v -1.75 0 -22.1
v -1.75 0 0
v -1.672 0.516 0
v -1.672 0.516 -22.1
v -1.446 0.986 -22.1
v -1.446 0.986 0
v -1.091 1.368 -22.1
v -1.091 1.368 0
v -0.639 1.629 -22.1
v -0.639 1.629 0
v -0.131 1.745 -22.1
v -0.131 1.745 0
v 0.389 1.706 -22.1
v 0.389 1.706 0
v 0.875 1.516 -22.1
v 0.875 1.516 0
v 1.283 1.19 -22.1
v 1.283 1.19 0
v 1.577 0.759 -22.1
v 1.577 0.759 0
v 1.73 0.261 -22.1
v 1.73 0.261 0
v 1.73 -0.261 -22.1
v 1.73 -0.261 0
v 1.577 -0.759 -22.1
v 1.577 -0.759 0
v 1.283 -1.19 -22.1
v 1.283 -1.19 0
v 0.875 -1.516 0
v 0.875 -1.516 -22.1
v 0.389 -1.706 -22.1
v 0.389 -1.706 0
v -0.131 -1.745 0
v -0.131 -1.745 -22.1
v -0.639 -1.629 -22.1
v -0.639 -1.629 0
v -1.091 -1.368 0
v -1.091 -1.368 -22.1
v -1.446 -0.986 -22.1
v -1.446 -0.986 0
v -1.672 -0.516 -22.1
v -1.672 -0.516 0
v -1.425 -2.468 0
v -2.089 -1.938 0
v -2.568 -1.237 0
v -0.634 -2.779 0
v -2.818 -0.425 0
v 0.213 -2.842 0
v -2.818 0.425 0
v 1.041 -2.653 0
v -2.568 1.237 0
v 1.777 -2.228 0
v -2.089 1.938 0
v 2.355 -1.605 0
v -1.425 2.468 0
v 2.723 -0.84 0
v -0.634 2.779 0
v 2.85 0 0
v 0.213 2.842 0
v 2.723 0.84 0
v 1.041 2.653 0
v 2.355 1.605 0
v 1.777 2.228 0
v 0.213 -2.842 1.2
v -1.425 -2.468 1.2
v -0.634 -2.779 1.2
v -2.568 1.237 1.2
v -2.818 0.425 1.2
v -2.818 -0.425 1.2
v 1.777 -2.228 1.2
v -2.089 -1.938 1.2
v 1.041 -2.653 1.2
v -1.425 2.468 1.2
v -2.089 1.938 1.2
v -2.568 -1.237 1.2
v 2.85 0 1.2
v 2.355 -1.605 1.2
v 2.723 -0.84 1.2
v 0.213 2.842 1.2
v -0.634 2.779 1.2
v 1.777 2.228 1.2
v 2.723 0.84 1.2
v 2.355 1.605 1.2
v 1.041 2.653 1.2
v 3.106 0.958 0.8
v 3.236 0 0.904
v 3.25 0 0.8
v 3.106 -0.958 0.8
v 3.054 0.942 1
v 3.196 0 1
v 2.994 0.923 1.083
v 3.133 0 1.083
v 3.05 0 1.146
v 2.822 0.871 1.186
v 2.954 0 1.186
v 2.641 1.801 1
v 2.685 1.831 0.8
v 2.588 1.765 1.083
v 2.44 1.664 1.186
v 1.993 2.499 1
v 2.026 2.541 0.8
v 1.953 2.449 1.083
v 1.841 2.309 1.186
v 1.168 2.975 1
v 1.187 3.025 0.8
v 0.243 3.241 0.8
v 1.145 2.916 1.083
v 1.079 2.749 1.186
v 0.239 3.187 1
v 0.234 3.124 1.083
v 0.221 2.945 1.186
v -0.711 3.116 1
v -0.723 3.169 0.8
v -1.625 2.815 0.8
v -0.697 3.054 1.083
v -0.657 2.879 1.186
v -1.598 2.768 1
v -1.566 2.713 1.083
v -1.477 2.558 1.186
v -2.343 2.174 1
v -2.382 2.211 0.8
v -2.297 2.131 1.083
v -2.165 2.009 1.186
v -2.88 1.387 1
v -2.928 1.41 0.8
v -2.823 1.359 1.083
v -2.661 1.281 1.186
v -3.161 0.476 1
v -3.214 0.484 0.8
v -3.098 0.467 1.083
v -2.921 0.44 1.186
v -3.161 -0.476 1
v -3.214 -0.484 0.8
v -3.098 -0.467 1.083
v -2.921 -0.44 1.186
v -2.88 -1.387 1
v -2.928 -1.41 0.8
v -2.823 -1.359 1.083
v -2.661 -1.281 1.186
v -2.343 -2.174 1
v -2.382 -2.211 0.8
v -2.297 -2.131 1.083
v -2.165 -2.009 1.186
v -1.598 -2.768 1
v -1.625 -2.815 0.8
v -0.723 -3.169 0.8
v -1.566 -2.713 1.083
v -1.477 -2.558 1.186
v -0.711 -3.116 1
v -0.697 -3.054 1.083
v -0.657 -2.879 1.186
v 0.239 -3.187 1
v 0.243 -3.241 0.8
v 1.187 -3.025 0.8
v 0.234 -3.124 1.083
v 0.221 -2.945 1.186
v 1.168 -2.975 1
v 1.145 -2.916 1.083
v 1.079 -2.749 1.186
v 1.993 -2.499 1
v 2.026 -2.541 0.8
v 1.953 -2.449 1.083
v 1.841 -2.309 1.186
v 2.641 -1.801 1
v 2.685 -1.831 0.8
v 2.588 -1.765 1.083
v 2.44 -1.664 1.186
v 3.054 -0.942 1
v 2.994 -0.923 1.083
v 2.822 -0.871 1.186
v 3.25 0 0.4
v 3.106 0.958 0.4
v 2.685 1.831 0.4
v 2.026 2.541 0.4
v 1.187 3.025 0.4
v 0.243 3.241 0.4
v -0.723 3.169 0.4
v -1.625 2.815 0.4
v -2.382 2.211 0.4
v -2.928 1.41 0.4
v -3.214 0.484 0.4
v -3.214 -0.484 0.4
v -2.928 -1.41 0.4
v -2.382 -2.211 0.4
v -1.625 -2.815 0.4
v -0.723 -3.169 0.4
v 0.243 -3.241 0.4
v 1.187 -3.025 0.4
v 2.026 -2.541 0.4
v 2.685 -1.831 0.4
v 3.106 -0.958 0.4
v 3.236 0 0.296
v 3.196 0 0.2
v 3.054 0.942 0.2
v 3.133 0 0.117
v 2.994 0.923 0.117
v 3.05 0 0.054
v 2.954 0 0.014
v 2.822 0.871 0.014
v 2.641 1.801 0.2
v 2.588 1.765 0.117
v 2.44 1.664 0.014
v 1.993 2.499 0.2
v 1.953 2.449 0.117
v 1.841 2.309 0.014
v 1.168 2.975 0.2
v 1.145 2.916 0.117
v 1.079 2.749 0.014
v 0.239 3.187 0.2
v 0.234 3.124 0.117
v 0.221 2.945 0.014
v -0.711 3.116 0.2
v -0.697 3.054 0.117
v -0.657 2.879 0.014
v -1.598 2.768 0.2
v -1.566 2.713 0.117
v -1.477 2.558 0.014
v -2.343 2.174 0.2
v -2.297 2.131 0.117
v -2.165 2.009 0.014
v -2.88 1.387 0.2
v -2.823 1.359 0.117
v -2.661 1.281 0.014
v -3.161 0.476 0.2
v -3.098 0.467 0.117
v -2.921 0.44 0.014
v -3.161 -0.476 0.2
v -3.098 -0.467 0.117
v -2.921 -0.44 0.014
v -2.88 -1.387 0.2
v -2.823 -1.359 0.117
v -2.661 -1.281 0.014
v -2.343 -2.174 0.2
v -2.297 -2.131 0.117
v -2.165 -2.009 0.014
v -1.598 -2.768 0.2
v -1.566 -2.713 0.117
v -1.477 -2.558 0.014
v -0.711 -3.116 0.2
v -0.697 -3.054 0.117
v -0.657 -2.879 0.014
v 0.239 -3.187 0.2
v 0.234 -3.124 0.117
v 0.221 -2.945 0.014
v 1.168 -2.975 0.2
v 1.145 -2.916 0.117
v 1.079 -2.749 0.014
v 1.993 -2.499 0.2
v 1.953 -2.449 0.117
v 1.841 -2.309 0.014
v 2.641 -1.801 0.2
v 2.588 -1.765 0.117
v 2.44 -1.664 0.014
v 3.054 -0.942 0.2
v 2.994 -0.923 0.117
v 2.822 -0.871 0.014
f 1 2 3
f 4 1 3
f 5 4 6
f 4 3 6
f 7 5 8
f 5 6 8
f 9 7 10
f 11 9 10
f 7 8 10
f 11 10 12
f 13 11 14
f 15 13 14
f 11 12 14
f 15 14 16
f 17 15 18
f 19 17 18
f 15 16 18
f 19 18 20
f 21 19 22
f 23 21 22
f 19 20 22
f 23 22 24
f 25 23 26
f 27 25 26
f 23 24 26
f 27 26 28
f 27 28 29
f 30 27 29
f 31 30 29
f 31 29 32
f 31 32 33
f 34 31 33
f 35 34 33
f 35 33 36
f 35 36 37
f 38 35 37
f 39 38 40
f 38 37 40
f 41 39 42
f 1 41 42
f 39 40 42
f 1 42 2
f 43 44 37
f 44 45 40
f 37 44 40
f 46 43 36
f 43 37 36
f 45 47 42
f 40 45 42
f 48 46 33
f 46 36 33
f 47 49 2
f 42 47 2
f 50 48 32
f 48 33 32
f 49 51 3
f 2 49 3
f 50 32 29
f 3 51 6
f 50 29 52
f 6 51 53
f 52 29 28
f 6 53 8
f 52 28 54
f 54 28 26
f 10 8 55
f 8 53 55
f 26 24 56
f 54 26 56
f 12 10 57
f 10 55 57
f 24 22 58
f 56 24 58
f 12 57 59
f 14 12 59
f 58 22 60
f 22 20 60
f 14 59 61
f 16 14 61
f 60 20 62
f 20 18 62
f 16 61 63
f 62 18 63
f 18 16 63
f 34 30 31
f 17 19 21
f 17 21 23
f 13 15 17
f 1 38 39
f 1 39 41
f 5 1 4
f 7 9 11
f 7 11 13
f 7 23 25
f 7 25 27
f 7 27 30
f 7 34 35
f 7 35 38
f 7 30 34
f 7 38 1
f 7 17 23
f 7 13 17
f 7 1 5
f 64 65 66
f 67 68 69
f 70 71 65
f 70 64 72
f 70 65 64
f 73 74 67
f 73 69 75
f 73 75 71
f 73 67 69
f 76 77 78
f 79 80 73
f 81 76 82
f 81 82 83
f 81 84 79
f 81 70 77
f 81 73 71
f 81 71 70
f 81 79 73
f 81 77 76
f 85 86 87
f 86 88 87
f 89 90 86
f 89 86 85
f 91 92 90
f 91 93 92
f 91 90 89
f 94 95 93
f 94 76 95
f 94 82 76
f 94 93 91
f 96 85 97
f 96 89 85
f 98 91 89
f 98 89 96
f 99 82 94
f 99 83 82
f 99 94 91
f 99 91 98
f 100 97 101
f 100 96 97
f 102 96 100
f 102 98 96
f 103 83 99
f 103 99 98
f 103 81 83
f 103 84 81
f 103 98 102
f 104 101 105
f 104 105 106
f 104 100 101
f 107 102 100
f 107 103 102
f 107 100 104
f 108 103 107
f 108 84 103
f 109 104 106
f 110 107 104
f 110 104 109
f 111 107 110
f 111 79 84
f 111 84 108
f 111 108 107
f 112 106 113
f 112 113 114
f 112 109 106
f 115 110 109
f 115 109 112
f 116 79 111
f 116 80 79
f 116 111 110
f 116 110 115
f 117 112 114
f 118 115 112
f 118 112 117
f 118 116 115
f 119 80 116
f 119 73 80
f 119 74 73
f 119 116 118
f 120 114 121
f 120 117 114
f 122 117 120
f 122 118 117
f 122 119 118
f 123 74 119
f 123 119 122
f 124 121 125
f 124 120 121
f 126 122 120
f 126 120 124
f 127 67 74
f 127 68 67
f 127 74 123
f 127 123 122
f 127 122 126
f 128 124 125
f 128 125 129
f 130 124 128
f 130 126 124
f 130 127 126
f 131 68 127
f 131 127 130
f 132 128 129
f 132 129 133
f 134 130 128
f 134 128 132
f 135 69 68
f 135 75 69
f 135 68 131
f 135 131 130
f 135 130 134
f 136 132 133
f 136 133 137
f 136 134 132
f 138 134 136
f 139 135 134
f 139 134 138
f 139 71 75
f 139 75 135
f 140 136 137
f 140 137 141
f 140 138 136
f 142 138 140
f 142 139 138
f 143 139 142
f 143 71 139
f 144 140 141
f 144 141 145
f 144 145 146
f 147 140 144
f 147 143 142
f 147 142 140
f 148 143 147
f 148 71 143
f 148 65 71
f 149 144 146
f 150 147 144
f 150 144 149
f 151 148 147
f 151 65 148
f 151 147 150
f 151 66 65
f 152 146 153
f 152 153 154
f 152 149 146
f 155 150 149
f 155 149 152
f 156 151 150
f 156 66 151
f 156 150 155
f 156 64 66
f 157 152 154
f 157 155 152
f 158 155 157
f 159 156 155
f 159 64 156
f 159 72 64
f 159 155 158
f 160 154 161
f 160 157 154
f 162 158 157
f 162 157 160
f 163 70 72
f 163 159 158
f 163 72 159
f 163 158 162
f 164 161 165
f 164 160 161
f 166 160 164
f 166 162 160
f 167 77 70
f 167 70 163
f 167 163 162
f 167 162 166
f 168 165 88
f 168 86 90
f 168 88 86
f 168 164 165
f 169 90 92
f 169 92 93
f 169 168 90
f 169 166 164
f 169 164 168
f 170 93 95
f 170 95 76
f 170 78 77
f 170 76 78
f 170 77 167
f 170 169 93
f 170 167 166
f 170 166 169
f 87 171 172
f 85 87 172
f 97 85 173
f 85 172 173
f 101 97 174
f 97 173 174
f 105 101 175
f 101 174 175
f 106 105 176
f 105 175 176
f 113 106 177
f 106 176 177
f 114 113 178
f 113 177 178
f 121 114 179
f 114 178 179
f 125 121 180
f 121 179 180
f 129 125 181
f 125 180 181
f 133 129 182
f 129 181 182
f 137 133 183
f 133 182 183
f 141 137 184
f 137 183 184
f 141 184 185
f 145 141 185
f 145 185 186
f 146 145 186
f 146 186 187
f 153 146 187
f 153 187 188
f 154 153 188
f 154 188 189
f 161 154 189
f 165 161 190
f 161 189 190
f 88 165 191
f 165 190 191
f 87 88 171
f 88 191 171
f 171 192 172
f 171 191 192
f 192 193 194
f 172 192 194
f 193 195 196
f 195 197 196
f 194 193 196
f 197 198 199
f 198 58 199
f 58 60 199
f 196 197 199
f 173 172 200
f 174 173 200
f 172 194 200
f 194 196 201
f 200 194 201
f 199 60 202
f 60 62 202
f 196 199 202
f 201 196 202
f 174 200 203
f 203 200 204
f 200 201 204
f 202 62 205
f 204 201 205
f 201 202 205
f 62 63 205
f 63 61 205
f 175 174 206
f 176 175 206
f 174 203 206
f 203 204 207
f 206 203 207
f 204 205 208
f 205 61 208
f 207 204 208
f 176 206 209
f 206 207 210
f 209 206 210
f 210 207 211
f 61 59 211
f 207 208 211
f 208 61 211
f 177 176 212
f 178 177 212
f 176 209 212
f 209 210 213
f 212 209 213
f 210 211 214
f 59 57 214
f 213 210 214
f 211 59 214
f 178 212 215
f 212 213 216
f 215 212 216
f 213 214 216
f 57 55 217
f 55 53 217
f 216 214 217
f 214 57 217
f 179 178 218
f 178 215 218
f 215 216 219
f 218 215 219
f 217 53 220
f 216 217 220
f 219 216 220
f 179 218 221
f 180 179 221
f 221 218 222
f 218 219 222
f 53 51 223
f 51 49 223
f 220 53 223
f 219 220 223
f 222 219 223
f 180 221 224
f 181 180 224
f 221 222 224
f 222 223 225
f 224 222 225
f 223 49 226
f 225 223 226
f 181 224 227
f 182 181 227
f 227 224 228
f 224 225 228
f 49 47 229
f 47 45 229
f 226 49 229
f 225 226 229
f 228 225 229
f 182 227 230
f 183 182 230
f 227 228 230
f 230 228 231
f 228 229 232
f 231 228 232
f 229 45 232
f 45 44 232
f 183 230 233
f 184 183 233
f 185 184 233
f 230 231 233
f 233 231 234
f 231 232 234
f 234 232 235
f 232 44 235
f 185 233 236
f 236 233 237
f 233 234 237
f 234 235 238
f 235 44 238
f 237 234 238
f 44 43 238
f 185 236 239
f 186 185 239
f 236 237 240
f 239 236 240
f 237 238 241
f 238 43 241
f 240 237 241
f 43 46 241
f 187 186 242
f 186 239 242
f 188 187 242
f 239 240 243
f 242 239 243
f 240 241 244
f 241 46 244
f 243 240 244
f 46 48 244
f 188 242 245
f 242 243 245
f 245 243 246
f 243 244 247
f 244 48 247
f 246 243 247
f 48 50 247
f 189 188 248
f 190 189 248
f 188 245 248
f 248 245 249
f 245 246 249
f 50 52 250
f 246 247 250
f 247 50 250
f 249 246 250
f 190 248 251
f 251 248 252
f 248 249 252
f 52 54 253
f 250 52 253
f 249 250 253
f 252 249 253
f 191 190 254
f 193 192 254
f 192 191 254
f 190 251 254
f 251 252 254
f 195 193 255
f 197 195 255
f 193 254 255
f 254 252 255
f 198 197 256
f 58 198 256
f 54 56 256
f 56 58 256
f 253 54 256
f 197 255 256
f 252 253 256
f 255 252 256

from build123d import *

# Parameters (mm, degrees)
CROQUIS1_R              = 3.25
SALIENTE_EXTRUIR1_DEPTH = 1.2
CROQUIS2_R              = 1.75
SALIENTE_EXTRUIR2_DEPTH = 22.1
REDONDEO2_R             = 0.4


with BuildPart() as part:
    # Croquis1 → Saliente-Extruir1 (new body)
    with BuildSketch(Plane.XY):
        Circle(CROQUIS1_R)
    extrude(amount=SALIENTE_EXTRUIR1_DEPTH)

    # Croquis2 → Saliente-Extruir2 (add)
    with BuildSketch(Plane(origin=(0, 0, 0), x_dir=(-1, 0, 0), z_dir=(0, 0, -1))):
        Circle(CROQUIS2_R)
    extrude(amount=SALIENTE_EXTRUIR2_DEPTH)

    # Redondeo2
    redondeo2_edges = [part.edges().sort_by_distance(p)[0] for p in [
        (-3.25, 0, 0),
        (-3.25, 0, 1.2),
    ]]
    fillet(redondeo2_edges, radius=REDONDEO2_R)


solid = part.part
